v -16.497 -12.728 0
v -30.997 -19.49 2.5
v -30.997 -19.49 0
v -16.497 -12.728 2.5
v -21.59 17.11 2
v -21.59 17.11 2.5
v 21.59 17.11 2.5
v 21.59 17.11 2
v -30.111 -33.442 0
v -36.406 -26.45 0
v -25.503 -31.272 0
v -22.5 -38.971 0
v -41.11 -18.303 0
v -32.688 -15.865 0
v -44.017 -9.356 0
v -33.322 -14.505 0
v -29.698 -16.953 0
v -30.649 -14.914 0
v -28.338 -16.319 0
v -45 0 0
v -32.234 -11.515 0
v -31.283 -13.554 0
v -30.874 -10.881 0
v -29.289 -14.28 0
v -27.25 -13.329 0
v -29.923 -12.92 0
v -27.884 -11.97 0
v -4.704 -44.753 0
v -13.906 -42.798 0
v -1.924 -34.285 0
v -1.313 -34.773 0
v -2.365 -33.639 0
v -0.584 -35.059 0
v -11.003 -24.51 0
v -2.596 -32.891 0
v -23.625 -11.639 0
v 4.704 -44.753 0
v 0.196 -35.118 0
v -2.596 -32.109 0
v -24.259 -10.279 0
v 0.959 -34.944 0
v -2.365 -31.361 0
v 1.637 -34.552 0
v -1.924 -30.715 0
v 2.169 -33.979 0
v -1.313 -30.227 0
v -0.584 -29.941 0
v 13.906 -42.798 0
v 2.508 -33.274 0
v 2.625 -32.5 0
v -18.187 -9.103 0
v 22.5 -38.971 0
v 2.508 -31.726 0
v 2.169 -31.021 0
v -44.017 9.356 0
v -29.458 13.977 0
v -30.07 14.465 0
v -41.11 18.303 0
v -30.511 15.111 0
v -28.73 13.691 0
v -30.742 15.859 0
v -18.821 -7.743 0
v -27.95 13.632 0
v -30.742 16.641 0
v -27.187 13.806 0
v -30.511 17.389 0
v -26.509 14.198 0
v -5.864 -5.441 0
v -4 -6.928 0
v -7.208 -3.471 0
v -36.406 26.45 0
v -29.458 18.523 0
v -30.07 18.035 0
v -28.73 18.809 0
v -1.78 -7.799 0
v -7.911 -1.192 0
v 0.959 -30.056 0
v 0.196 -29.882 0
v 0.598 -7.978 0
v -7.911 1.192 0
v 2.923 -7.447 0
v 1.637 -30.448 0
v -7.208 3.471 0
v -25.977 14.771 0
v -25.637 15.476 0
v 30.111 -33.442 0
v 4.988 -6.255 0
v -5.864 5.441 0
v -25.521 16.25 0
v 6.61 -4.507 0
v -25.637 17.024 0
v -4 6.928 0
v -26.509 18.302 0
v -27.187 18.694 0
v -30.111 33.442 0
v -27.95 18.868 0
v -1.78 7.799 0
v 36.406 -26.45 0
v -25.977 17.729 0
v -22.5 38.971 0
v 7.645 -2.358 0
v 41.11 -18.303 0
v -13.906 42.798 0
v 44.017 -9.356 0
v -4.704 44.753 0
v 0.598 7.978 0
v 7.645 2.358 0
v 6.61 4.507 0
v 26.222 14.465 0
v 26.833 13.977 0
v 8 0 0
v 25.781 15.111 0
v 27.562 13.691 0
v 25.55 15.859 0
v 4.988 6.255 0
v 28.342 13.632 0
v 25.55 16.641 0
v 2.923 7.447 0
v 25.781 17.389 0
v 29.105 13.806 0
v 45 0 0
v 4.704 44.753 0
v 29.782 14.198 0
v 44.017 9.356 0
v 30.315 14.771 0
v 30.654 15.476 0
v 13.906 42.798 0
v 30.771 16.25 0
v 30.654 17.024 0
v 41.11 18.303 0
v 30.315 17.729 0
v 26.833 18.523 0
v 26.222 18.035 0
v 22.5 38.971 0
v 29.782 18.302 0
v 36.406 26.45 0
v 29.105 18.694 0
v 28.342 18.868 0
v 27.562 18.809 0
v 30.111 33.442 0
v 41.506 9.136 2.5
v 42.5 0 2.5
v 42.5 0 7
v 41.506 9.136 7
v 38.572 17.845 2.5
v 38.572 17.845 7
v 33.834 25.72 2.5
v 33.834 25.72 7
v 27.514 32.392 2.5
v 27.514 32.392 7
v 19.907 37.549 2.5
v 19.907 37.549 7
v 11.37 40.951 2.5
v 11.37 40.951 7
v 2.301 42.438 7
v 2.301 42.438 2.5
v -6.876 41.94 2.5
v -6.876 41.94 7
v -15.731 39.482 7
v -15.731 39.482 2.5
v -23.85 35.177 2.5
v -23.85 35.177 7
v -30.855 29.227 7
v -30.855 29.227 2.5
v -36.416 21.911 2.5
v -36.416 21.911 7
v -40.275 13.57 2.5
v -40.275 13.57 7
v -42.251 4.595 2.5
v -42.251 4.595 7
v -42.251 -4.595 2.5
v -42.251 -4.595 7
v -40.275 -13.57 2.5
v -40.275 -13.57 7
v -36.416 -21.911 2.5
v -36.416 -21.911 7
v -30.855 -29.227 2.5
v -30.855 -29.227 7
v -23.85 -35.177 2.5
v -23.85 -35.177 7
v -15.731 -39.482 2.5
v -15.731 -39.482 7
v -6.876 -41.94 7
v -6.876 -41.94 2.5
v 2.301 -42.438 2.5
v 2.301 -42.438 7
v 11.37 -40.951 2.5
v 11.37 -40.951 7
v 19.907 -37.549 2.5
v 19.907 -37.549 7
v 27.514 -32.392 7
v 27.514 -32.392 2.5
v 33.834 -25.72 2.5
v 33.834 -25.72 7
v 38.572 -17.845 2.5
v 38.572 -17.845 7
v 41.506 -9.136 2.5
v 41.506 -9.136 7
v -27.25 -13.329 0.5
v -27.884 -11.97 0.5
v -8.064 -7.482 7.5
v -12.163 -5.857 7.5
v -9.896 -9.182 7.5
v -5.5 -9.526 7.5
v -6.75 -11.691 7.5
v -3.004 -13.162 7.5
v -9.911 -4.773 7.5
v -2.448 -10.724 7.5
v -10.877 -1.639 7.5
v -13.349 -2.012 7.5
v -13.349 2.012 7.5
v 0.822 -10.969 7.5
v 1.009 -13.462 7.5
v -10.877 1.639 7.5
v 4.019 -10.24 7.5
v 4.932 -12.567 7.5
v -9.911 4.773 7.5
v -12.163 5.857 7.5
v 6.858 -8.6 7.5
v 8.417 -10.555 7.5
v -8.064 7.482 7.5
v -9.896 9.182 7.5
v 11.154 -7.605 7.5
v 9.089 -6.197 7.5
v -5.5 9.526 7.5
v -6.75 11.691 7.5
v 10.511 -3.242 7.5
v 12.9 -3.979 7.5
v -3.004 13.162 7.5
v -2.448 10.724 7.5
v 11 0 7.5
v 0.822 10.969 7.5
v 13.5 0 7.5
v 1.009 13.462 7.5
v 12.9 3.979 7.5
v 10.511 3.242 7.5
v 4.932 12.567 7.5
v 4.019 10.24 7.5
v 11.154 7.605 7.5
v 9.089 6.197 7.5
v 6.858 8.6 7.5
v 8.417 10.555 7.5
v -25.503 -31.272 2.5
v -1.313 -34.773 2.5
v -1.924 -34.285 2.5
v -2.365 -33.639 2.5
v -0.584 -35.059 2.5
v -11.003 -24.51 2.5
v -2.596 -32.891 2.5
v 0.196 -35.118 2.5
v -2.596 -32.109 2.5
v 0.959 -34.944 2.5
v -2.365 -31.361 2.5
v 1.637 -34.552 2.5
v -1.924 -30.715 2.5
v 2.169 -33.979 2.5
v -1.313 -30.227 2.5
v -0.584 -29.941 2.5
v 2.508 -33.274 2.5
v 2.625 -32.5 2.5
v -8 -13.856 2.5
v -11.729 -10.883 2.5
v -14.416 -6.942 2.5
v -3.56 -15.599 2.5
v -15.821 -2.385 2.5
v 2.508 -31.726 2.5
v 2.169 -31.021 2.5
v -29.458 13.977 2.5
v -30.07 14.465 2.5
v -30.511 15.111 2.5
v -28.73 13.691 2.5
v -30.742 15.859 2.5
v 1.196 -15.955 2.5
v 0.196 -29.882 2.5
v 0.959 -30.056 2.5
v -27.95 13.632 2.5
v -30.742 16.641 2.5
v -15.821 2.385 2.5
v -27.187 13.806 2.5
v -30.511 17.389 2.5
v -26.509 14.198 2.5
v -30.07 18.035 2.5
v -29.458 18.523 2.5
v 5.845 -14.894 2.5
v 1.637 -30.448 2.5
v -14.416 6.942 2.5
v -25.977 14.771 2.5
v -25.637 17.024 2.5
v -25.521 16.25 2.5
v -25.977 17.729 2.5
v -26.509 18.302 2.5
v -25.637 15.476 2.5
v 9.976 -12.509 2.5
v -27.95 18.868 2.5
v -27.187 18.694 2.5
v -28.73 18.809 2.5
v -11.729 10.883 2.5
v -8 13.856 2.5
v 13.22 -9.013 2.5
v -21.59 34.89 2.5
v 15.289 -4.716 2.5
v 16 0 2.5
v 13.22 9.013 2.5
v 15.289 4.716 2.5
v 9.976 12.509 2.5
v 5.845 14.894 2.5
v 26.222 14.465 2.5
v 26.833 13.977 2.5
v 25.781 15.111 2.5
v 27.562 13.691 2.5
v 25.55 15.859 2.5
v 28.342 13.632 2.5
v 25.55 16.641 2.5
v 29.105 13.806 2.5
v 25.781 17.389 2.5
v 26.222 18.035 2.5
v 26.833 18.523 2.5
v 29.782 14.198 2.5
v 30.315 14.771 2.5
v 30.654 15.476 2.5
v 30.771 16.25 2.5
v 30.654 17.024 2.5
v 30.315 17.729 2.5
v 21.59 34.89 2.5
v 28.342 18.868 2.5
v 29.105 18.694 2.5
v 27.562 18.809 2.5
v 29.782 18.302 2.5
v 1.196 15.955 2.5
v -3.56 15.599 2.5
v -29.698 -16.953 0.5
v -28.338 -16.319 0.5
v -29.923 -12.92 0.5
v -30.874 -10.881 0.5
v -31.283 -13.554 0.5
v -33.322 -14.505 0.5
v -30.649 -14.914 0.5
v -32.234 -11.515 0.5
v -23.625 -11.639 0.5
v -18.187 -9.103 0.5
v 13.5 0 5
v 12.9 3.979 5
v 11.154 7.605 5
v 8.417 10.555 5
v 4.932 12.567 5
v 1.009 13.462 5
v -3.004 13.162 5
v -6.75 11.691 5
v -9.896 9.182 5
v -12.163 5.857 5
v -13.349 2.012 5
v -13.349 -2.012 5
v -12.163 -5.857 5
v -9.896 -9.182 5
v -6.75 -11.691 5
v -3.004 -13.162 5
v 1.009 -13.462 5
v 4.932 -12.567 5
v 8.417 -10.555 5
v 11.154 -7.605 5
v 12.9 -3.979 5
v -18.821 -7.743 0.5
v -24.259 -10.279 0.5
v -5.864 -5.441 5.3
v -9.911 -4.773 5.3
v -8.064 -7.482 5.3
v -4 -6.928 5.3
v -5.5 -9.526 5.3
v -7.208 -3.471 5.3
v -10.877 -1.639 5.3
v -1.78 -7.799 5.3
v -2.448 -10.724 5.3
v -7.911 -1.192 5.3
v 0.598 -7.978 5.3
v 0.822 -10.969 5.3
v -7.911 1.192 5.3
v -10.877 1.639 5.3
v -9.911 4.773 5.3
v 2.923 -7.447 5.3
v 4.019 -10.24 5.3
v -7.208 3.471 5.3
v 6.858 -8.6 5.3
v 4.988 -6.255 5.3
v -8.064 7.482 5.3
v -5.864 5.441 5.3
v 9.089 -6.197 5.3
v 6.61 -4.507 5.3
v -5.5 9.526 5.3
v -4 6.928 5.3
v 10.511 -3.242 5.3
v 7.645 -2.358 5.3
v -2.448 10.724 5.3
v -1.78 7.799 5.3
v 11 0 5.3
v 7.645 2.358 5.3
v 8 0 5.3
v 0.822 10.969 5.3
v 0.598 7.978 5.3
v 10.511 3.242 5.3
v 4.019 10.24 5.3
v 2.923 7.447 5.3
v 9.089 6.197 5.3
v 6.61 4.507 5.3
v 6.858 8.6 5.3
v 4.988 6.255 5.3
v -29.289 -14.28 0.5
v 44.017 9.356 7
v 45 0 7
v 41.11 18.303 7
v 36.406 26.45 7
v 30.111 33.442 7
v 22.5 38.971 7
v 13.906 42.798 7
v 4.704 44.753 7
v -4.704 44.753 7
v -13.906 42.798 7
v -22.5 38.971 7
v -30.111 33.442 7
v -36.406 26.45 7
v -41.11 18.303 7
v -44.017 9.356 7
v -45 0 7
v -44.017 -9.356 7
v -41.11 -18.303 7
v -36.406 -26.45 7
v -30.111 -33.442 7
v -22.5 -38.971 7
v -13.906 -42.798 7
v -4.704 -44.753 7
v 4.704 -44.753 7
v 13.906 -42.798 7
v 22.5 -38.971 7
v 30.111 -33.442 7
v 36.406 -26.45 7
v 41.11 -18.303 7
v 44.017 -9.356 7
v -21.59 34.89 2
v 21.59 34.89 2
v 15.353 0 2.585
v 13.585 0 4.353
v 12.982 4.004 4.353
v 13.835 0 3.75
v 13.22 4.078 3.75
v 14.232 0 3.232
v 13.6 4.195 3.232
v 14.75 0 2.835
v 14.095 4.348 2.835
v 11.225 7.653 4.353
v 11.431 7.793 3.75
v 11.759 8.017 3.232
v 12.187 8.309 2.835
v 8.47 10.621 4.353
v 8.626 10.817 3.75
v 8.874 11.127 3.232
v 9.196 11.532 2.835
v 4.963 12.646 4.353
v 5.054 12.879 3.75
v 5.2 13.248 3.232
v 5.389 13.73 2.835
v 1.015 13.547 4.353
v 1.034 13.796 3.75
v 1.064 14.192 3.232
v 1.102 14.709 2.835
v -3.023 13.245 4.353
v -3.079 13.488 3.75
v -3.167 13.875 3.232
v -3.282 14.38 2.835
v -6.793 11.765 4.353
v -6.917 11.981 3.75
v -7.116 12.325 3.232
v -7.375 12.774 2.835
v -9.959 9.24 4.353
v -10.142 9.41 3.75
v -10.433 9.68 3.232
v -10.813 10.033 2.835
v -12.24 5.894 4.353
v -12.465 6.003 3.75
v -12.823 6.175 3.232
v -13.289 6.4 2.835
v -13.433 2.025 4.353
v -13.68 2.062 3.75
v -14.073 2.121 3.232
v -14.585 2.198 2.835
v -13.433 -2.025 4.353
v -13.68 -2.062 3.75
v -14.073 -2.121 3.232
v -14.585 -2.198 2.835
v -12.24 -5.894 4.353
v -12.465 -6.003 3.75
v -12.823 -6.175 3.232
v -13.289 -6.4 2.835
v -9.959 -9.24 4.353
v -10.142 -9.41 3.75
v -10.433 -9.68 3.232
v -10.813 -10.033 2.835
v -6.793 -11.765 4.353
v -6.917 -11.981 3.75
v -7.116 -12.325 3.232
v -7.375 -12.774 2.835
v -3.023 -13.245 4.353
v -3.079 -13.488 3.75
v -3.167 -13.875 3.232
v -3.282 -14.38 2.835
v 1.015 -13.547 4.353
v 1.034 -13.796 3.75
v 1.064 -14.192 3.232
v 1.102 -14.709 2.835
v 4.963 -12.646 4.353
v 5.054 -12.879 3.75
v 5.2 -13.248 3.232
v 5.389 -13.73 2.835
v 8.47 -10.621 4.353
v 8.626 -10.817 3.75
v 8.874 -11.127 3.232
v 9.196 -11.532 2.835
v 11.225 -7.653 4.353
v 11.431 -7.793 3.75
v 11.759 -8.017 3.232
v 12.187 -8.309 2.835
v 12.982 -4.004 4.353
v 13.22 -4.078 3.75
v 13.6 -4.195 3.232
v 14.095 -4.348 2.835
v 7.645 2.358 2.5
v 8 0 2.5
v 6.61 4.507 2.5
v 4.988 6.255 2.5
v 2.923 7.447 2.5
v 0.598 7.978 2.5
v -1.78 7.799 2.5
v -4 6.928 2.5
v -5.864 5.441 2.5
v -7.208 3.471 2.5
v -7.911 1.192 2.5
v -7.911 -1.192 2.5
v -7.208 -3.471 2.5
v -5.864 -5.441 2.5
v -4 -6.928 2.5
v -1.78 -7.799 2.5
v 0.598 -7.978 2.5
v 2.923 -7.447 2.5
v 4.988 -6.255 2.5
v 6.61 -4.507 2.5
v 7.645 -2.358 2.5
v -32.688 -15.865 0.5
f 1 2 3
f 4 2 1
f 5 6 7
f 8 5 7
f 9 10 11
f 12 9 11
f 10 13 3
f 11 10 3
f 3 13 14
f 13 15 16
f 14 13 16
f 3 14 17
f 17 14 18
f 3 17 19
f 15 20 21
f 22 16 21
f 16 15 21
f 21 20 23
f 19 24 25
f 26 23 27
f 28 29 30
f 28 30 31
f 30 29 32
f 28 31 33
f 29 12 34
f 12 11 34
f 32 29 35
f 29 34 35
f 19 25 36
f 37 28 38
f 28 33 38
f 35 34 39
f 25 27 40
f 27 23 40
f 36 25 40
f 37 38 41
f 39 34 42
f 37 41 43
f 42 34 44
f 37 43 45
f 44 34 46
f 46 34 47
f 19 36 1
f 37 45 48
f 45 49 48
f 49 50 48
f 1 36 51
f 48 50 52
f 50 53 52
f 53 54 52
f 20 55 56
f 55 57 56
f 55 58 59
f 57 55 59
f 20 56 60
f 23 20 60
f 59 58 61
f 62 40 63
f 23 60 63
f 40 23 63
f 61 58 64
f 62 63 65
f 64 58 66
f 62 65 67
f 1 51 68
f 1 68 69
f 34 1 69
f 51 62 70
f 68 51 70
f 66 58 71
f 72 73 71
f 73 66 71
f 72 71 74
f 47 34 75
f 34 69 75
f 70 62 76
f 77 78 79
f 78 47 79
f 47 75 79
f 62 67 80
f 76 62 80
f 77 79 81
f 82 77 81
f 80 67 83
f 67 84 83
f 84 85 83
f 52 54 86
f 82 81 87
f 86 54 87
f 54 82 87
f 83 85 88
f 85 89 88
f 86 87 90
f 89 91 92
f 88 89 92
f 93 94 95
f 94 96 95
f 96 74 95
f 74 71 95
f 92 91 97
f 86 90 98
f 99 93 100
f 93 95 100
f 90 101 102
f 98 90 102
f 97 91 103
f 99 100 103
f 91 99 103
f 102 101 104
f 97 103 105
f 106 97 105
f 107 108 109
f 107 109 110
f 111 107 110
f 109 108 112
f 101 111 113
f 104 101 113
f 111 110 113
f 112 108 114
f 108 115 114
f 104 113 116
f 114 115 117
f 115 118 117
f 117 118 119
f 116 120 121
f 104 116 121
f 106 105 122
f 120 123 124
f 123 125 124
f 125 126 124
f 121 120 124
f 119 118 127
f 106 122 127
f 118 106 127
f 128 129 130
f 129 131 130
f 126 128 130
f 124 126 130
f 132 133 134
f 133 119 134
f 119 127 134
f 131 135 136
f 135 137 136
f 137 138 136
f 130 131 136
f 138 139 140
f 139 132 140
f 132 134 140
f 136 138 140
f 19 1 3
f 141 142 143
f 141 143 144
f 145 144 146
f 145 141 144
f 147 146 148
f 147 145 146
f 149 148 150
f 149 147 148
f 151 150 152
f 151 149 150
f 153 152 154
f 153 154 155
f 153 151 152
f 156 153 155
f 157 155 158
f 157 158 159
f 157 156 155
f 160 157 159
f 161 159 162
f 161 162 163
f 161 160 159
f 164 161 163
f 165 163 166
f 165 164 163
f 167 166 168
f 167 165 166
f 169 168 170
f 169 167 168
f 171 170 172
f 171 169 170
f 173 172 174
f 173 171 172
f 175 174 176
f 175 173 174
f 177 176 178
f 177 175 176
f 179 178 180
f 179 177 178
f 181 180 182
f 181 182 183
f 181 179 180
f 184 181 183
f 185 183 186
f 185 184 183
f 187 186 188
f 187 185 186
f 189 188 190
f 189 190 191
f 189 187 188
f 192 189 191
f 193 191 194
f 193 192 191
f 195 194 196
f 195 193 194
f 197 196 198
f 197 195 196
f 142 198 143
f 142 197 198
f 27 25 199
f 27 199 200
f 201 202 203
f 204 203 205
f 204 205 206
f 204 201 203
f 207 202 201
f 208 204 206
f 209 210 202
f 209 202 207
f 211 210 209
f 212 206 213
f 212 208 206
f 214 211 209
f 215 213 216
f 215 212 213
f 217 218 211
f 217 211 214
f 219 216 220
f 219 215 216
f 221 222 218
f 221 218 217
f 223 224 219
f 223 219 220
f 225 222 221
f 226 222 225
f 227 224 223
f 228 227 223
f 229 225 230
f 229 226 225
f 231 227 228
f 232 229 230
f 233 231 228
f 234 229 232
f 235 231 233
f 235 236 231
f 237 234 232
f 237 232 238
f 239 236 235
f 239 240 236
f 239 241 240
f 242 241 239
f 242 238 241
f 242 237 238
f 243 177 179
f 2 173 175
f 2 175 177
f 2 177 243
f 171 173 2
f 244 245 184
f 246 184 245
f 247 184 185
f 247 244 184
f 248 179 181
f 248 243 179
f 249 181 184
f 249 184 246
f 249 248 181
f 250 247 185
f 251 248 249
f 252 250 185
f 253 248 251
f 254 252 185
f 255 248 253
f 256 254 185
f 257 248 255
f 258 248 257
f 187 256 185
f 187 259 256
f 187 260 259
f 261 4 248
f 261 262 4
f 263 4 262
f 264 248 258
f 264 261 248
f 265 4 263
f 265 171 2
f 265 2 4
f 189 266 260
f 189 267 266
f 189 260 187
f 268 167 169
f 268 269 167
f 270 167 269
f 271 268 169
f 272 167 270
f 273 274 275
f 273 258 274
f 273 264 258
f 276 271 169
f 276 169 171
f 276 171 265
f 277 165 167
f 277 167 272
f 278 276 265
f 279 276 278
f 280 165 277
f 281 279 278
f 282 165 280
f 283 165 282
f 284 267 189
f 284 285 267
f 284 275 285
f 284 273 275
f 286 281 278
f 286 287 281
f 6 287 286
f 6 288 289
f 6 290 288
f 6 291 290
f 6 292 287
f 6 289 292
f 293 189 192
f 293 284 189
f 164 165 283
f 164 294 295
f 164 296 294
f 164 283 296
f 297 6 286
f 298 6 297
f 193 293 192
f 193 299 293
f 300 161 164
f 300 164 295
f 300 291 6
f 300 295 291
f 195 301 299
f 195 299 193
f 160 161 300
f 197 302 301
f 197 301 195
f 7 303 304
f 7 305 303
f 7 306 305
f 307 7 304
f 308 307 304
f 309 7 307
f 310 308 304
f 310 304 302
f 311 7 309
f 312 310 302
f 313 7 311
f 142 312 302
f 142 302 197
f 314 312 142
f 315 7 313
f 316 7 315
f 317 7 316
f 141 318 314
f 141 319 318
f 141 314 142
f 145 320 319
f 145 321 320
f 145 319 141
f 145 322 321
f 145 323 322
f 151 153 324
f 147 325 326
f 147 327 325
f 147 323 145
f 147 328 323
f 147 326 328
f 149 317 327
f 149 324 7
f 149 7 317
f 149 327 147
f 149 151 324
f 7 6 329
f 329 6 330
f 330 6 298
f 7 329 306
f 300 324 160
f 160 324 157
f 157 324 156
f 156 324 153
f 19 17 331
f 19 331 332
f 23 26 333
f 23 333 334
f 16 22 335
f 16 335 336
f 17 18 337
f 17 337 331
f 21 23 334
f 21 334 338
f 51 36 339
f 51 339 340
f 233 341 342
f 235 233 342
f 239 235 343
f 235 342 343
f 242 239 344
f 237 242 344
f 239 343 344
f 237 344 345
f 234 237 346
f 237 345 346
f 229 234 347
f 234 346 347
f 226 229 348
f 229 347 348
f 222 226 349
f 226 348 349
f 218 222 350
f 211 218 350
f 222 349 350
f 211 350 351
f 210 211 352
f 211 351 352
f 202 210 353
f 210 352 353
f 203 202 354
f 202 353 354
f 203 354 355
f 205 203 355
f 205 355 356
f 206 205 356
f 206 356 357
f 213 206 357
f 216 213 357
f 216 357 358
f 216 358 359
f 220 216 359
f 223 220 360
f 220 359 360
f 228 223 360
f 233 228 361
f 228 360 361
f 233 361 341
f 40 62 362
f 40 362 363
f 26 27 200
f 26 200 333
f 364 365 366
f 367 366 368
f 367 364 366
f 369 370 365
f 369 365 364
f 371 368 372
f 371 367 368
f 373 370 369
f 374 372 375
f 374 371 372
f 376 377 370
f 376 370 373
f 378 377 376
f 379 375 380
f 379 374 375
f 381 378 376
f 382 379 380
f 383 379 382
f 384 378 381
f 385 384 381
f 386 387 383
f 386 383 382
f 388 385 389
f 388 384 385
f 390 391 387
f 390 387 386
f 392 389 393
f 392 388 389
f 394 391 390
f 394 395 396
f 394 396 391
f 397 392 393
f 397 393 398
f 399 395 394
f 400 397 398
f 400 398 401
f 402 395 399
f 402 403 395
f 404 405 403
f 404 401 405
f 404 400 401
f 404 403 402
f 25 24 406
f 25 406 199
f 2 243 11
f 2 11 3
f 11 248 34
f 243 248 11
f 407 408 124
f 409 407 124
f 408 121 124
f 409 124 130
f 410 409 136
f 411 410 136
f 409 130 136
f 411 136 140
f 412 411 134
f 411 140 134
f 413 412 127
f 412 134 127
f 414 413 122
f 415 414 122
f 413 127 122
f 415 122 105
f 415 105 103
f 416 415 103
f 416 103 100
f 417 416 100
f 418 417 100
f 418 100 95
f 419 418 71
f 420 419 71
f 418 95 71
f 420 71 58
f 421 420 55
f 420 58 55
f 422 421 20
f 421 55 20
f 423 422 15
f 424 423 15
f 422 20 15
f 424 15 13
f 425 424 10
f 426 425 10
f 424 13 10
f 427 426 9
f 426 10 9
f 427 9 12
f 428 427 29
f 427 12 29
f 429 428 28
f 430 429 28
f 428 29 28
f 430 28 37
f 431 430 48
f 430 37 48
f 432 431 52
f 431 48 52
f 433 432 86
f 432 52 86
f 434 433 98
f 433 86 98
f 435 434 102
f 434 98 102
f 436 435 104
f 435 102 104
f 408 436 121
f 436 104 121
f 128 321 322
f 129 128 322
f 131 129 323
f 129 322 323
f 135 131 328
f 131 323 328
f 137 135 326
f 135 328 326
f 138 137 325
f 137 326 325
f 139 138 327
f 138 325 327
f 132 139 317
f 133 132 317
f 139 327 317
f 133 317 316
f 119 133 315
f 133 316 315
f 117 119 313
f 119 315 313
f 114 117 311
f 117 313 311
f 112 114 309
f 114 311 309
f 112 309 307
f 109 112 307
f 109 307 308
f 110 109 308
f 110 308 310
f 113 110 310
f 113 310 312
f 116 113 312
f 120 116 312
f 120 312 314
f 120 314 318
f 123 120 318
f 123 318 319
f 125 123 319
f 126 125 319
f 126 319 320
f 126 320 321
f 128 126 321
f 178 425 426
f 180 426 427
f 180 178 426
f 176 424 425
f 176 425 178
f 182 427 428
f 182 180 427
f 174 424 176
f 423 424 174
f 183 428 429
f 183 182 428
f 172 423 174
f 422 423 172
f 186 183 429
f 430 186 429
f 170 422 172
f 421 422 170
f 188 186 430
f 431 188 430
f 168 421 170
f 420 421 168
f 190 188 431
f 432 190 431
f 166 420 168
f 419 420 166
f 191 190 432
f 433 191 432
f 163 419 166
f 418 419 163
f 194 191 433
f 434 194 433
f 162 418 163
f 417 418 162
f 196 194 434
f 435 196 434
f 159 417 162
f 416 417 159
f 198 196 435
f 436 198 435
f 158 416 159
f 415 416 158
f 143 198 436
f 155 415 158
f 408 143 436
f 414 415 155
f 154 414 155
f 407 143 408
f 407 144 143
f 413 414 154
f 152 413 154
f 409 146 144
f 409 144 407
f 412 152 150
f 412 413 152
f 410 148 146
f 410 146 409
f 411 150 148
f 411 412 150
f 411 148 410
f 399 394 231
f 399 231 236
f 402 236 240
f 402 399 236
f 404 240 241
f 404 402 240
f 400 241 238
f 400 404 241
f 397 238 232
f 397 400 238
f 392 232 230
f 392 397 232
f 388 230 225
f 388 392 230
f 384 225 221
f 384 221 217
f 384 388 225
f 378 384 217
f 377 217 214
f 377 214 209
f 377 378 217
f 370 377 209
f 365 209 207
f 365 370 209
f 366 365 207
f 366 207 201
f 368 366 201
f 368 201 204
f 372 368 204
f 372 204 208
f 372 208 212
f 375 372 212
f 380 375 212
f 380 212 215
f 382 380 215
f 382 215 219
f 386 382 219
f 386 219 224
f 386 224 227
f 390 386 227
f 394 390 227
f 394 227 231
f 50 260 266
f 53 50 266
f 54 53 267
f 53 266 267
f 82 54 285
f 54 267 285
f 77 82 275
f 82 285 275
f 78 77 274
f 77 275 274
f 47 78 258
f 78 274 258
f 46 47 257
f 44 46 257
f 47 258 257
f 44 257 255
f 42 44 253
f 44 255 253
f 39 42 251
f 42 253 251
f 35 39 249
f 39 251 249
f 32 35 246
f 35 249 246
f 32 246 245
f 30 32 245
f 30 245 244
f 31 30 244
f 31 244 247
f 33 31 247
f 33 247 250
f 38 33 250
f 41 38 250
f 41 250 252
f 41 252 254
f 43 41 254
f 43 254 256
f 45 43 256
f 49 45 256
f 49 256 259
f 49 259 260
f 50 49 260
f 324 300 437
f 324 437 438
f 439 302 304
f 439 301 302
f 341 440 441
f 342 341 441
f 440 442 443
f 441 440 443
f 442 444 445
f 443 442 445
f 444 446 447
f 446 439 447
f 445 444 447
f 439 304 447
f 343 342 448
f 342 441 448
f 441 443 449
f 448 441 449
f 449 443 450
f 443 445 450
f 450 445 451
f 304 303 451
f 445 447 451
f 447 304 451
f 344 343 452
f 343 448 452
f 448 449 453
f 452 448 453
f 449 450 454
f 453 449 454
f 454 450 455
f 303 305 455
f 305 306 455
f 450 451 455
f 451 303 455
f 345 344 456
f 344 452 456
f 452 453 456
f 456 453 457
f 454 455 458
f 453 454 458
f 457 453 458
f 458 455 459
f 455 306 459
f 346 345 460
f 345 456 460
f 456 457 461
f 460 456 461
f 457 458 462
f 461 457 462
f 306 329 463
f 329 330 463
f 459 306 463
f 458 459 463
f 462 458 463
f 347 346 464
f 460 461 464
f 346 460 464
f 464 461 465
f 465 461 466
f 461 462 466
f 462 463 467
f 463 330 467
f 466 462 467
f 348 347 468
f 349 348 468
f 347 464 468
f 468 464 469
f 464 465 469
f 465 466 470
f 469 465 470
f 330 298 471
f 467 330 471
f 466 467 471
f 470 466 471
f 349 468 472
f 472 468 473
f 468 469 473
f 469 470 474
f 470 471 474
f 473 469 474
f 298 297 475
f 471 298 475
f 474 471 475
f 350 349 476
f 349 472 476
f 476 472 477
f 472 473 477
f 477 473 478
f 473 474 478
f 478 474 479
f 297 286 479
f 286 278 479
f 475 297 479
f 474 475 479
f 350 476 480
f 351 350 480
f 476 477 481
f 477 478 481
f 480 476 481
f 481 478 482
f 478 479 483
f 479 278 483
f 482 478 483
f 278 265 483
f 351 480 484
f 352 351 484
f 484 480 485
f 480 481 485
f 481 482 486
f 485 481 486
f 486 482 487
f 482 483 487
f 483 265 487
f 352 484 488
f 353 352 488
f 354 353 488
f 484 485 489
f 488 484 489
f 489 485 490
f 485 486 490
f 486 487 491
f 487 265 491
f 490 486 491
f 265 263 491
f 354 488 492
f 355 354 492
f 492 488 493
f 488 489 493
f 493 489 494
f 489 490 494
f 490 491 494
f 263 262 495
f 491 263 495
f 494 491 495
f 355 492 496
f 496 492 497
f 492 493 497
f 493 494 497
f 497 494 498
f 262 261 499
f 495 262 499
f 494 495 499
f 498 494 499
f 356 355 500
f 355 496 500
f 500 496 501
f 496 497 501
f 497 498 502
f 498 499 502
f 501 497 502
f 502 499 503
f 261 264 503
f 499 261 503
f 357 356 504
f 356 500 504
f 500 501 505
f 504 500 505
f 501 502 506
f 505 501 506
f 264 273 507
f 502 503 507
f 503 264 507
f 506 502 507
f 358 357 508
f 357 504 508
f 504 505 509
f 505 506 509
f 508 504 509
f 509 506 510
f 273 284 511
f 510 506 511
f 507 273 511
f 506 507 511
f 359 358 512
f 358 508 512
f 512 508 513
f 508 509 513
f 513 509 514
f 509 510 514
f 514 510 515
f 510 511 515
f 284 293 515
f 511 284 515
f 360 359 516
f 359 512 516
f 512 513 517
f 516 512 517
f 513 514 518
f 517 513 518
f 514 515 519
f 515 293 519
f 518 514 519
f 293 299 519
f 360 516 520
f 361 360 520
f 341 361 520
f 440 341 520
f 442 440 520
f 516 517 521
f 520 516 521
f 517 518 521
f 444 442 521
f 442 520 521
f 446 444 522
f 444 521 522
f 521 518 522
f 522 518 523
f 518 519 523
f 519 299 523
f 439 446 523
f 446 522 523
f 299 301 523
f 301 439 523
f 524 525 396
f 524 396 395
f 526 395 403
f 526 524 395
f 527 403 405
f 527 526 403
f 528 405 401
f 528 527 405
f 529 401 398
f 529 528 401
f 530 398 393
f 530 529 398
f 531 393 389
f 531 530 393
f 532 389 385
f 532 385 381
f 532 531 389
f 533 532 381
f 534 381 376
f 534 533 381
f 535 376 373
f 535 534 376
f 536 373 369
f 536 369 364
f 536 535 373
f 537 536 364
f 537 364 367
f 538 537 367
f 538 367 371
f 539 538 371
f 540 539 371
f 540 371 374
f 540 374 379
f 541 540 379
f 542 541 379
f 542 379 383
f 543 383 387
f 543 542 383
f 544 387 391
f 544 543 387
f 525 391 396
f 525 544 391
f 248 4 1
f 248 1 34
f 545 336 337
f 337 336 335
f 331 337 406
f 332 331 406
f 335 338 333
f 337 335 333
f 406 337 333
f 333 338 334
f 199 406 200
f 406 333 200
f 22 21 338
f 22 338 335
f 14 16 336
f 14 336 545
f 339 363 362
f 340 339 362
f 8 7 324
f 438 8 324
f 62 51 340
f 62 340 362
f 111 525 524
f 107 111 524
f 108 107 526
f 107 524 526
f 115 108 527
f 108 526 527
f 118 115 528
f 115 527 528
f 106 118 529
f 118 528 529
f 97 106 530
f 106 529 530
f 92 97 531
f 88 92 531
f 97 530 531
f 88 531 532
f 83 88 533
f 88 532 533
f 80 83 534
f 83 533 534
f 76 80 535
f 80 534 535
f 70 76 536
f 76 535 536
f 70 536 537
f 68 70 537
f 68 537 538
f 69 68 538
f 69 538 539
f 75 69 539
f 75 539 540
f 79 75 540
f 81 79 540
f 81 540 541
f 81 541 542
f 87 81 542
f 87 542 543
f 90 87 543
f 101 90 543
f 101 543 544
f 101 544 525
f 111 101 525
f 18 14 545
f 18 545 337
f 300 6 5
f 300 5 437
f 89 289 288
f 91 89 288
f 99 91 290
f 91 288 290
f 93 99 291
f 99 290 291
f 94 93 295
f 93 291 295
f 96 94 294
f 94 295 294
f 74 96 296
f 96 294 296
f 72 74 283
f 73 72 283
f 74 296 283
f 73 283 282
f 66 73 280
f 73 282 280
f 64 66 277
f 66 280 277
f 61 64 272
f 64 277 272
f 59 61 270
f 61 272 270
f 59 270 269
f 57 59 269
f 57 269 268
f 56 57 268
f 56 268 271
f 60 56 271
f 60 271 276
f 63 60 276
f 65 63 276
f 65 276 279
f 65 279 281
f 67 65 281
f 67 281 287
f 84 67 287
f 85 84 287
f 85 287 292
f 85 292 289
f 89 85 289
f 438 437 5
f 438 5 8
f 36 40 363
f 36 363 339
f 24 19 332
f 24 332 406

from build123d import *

# Parameters (mm, degrees)
SKETCH1_R               = 45
BOSS_EXTRUDE1_DEPTH     = 2.5
SKETCH2_R               = 45
SKETCH2_R_2             = 42.5
BOSS_EXTRUDE2_DEPTH     = 4.5
SKETCH3_R               = 8
CUT_EXTRUDE1_DEPTH      = 10
SKETCH5_R               = 13.5
SKETCH5_R_2             = 11
BOSS_EXTRUDE3_DEPTH     = 5
SKETCH7_W               = 43.18
SKETCH7_H               = 17.78
CUT_EXTRUDE2_DEPTH      = 0.5
CUT_EXTRUDE3_DEPTH      = 5
CUT_EXTRUDE4_DEPTH      = 0.5
SKETCH11_R              = 13.5
SKETCH11_R_2            = 8
BOSS_EXTRUDE4_DEPTH     = 2.8
SKETCH14_R              = 2.625
CUT_EXTRUDE5_DEPTH      = 6
CUT_EXTRUDE5_DEPTH_BACK = 3.5
FILLET1_R               = 2.5


with BuildPart() as part:
    # Sketch1 → Boss-Extrude1 (new body)
    with BuildSketch(Plane.XY):
        Circle(SKETCH1_R)
    extrude(amount=BOSS_EXTRUDE1_DEPTH)

    # Sketch2 → Boss-Extrude2 (add)
    with BuildSketch(Plane.XY.offset(2.5)):
        Circle(SKETCH2_R)
        Circle(SKETCH2_R_2, mode=Mode.SUBTRACT)
    extrude(amount=BOSS_EXTRUDE2_DEPTH)

    # Sketch3 → Cut-Extrude1 (cut)
    with BuildSketch(Plane.XY.offset(2.5)):
        Circle(SKETCH3_R)
    extrude(amount=-CUT_EXTRUDE1_DEPTH, mode=Mode.SUBTRACT)

    # Sketch5 → Boss-Extrude3 (add)
    with BuildSketch(Plane.XY.offset(2.5)):
        Circle(SKETCH5_R)
        Circle(SKETCH5_R_2, mode=Mode.SUBTRACT)
    extrude(amount=BOSS_EXTRUDE3_DEPTH)

    # Sketch7 → Cut-Extrude2 (cut)
    with BuildSketch(Plane.XY.offset(2.5)):
        with Locations((0, 26)):
            Rectangle(SKETCH7_W, SKETCH7_H)
    extrude(amount=-CUT_EXTRUDE2_DEPTH, mode=Mode.SUBTRACT)

    # Sketch8 → Cut-Extrude3 (cut)
    with BuildSketch(Plane.XY.offset(2.5)):
        Polygon((-16.496556405, -12.72805329), (-11.002519002, -24.510054522), (-25.503443595, -31.27194671), (-30.997480998, -19.489945478), align=None)
    extrude(amount=-CUT_EXTRUDE3_DEPTH, mode=Mode.SUBTRACT)

    # Sketch9 → Cut-Extrude4 (cut)
    with BuildSketch(Plane(origin=(0, 0, 0), x_dir=(-1, 0, 0), z_dir=(0, 0, -1))):
        Polygon((27.250107322, -13.32900476), (27.884034715, -11.969543079), (29.923227236, -12.920434168), (30.874118325, -10.881241647), (32.233580005, -11.51516904), (31.282688916, -13.554361561), (33.321881437, -14.505252649), (32.687954045, -15.86471433), (30.648761524, -14.913823241), (29.697870435, -16.953015762), (28.338408754, -16.319088369), (29.289299843, -14.279895849), align=None)
        Polygon((18.187029452, -9.102822142), (18.820956845, -7.743360462), (24.258803567, -10.279070032), (23.624876174, -11.638531713), align=None)
    extrude(amount=-CUT_EXTRUDE4_DEPTH, mode=Mode.SUBTRACT)

    # Sketch11 → Boss-Extrude4 (add)
    with BuildSketch(Plane.XY.offset(2.5)):
        Circle(SKETCH11_R)
        Circle(SKETCH11_R_2, mode=Mode.SUBTRACT)
    extrude(amount=BOSS_EXTRUDE4_DEPTH)

    # Sketch14 → Cut-Extrude5 (cut, two sides)
    with BuildSketch(Plane.XY.offset(2.5)) as cut_extrude5_sk:
        with Locations((0, -32.5)):
            Circle(SKETCH14_R)
        with Locations((-28.145825623, 16.25)):
            Circle(SKETCH14_R)
        with Locations((28.145825623, 16.25)):
            Circle(SKETCH14_R)
    extrude(amount=CUT_EXTRUDE5_DEPTH, mode=Mode.SUBTRACT)
    extrude(cut_extrude5_sk.sketch, amount=-CUT_EXTRUDE5_DEPTH_BACK, mode=Mode.SUBTRACT)

    # Fillet1
    fillet1_edges = [part.edges().sort_by_distance(p)[0] for p in [
        (-13.5, 0, 2.5),
    ]]
    fillet(fillet1_edges, radius=FILLET1_R)


solid = part.part
